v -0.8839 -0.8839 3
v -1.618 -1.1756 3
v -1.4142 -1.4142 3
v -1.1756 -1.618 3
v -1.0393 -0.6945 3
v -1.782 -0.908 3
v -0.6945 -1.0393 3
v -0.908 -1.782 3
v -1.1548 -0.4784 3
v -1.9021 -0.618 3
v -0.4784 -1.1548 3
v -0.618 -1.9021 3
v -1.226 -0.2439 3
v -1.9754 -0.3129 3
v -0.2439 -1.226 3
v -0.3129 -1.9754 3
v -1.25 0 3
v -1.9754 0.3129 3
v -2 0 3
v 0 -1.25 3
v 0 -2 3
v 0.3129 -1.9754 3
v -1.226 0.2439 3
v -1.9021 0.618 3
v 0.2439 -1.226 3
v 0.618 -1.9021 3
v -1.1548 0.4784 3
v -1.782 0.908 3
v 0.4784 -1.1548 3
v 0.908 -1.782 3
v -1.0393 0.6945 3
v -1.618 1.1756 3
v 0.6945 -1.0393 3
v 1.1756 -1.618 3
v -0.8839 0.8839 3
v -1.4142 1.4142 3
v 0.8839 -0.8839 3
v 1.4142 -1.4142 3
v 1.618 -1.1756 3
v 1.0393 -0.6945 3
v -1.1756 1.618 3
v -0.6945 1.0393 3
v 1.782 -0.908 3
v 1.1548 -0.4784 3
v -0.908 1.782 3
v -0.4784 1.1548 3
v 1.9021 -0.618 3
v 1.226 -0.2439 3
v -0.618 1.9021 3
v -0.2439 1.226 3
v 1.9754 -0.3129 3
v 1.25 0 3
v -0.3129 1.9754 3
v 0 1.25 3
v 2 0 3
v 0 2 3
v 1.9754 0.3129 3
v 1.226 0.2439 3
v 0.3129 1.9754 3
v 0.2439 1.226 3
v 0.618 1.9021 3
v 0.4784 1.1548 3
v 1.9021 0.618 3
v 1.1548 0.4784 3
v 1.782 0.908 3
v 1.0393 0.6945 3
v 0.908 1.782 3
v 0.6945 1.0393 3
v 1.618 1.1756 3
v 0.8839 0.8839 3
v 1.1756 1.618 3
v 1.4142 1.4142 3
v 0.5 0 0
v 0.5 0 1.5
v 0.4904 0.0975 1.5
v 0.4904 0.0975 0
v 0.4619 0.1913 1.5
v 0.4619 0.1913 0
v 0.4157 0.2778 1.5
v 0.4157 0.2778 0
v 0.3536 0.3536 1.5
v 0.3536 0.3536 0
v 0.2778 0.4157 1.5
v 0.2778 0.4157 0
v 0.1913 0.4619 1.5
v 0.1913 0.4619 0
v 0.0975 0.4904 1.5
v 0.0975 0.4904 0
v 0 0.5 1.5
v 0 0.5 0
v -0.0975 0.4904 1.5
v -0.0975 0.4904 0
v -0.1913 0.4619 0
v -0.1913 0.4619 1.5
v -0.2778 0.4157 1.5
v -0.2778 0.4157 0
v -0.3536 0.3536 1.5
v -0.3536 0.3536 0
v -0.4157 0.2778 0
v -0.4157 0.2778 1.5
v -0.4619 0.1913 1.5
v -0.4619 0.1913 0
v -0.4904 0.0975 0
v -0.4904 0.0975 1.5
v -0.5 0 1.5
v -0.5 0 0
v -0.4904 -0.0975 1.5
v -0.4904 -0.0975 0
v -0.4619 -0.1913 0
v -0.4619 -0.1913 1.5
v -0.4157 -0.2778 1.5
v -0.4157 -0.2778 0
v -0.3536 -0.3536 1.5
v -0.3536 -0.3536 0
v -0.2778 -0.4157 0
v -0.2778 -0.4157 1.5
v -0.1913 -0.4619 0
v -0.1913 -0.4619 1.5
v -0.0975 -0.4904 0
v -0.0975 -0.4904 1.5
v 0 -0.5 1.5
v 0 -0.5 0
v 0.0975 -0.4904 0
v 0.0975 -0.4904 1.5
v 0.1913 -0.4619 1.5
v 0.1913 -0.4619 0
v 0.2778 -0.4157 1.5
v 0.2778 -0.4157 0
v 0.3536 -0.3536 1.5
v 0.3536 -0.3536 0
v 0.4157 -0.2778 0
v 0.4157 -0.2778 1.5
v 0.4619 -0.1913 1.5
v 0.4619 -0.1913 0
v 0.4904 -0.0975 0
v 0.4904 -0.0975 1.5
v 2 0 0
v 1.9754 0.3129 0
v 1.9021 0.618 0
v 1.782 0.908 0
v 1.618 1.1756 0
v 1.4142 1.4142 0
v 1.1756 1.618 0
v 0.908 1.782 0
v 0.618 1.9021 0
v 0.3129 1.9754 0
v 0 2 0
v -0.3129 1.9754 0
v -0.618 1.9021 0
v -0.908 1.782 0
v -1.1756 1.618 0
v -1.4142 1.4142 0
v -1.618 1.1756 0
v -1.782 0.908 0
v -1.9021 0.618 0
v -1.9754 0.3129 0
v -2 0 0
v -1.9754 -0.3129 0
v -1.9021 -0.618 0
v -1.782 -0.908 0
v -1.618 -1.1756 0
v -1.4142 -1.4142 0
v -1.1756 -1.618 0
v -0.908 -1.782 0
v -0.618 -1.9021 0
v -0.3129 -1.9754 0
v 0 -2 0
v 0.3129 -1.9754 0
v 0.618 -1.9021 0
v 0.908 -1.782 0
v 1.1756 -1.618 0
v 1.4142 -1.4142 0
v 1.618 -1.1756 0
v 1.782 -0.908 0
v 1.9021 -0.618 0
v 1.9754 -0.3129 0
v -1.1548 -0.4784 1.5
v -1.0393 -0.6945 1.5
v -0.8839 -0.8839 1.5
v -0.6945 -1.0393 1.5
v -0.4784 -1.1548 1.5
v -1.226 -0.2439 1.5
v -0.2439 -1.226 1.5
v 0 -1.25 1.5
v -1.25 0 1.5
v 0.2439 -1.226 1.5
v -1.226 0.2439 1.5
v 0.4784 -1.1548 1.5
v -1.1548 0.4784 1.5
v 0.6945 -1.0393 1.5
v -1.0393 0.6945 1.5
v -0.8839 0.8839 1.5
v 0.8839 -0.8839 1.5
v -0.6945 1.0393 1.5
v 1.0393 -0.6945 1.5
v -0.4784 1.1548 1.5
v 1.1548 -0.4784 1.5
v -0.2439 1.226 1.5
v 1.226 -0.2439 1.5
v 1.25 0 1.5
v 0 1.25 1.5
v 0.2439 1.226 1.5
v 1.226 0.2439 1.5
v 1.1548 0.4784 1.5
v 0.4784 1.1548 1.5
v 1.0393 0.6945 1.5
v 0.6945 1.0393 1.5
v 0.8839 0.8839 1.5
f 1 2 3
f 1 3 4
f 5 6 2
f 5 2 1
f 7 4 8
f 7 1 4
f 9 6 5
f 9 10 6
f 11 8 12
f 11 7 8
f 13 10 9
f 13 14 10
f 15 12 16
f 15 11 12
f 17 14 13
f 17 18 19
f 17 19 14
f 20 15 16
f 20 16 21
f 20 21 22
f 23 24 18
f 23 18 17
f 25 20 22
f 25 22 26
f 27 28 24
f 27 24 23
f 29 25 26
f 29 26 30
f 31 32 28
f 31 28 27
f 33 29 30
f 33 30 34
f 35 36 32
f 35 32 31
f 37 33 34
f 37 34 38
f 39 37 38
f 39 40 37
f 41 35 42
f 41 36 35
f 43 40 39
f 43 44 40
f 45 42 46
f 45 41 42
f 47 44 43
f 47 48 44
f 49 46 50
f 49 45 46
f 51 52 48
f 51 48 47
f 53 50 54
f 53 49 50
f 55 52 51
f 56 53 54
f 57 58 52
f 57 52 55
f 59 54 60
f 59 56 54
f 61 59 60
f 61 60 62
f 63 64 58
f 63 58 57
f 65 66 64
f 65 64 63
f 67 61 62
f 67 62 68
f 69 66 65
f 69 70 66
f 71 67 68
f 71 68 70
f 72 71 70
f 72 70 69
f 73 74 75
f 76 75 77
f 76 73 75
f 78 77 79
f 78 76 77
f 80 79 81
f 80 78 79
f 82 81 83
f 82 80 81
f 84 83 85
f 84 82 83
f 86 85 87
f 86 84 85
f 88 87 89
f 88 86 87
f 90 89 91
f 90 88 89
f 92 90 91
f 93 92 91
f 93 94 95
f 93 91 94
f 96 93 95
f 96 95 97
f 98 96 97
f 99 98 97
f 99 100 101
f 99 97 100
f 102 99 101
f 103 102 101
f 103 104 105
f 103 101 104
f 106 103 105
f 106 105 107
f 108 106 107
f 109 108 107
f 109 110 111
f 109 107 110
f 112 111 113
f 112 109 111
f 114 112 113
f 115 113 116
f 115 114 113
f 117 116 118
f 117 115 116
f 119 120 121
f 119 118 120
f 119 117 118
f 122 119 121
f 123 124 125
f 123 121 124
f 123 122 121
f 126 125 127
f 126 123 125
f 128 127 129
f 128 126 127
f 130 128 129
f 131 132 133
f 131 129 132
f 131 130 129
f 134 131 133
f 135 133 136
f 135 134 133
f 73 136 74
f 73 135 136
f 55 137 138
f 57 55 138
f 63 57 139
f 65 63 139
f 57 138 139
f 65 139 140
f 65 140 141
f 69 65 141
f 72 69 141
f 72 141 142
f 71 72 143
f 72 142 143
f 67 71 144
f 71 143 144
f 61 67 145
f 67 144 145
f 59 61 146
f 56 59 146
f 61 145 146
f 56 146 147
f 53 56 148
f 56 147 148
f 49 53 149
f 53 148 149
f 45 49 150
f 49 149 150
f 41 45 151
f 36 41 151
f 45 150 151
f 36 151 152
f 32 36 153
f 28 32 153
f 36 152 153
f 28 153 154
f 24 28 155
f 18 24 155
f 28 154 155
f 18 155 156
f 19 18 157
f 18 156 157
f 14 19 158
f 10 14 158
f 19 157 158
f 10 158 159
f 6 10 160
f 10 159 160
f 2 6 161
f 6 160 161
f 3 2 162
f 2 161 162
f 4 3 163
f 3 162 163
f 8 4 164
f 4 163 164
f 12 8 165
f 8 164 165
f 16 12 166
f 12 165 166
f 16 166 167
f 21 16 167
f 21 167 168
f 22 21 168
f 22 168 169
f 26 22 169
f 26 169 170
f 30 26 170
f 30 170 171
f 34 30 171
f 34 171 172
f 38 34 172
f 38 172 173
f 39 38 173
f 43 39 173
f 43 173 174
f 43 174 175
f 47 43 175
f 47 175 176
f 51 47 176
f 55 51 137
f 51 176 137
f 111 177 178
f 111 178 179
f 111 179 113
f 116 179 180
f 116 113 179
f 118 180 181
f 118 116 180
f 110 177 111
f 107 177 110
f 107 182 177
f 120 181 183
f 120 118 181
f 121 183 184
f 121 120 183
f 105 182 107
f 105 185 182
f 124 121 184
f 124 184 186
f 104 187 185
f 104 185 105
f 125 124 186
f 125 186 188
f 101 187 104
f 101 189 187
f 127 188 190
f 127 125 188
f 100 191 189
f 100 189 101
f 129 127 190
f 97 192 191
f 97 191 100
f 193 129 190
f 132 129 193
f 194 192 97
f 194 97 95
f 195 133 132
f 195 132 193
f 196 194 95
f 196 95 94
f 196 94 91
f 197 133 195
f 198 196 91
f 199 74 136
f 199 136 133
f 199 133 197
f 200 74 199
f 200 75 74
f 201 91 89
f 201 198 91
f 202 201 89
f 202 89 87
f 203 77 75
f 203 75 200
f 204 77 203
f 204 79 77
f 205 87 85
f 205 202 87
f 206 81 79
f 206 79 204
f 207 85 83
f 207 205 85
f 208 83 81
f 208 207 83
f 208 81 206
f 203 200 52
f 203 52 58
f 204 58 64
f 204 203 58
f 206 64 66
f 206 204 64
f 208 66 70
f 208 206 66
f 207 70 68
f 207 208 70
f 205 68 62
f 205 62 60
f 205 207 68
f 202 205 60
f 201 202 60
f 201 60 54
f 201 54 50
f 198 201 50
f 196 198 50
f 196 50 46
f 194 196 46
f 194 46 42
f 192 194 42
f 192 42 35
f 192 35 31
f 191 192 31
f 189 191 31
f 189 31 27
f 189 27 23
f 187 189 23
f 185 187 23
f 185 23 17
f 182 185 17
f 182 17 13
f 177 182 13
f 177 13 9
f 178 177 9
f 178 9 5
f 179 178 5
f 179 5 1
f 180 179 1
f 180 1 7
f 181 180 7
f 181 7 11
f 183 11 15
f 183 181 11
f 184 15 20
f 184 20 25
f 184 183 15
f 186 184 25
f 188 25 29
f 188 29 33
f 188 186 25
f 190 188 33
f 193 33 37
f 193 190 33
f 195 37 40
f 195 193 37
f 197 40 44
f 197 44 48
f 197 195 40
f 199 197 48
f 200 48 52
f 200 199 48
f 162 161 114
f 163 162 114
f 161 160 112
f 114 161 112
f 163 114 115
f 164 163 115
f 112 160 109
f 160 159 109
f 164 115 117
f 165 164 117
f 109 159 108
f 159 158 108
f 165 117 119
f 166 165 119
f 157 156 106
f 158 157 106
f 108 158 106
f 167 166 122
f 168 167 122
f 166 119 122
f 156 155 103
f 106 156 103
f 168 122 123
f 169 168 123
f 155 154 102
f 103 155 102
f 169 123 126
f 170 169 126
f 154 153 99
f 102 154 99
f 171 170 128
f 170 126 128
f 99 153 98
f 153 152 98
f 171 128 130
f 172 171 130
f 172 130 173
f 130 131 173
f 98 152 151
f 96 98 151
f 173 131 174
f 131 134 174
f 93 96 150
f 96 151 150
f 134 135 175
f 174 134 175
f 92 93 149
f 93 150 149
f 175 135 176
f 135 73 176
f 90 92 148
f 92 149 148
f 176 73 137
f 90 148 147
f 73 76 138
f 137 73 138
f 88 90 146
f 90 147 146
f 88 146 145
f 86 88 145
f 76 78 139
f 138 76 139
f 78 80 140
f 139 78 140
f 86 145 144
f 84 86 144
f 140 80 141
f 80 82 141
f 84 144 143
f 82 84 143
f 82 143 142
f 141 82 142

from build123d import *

# Parameters (mm, degrees)
F0_R     = 2
F0_R_2   = 1.25
F1_DEPTH = 3
F0_R_3   = 0.5
F2_DEPTH = 1.5
F3_DEPTH = 25


with BuildPart() as f1:
    # F0 (on Top) → F1 (new body)
    with BuildSketch(Plane.XY):
        Circle(F0_R)
        Circle(F0_R_2, mode=Mode.SUBTRACT)
    extrude(amount=F1_DEPTH)

    # F0 (on Top) → F2 (join)
    with BuildSketch(Plane.XY):
        Circle(F0_R_2)
        Circle(F0_R_3, mode=Mode.SUBTRACT)
        Circle(F0_R_3)
    extrude(amount=F2_DEPTH)

    # F0 (on Top) → F3 (cut)
    with BuildSketch(Plane.XY):
        Circle(F0_R_3)
    extrude(amount=F3_DEPTH, mode=Mode.SUBTRACT)


solid = f1.part
